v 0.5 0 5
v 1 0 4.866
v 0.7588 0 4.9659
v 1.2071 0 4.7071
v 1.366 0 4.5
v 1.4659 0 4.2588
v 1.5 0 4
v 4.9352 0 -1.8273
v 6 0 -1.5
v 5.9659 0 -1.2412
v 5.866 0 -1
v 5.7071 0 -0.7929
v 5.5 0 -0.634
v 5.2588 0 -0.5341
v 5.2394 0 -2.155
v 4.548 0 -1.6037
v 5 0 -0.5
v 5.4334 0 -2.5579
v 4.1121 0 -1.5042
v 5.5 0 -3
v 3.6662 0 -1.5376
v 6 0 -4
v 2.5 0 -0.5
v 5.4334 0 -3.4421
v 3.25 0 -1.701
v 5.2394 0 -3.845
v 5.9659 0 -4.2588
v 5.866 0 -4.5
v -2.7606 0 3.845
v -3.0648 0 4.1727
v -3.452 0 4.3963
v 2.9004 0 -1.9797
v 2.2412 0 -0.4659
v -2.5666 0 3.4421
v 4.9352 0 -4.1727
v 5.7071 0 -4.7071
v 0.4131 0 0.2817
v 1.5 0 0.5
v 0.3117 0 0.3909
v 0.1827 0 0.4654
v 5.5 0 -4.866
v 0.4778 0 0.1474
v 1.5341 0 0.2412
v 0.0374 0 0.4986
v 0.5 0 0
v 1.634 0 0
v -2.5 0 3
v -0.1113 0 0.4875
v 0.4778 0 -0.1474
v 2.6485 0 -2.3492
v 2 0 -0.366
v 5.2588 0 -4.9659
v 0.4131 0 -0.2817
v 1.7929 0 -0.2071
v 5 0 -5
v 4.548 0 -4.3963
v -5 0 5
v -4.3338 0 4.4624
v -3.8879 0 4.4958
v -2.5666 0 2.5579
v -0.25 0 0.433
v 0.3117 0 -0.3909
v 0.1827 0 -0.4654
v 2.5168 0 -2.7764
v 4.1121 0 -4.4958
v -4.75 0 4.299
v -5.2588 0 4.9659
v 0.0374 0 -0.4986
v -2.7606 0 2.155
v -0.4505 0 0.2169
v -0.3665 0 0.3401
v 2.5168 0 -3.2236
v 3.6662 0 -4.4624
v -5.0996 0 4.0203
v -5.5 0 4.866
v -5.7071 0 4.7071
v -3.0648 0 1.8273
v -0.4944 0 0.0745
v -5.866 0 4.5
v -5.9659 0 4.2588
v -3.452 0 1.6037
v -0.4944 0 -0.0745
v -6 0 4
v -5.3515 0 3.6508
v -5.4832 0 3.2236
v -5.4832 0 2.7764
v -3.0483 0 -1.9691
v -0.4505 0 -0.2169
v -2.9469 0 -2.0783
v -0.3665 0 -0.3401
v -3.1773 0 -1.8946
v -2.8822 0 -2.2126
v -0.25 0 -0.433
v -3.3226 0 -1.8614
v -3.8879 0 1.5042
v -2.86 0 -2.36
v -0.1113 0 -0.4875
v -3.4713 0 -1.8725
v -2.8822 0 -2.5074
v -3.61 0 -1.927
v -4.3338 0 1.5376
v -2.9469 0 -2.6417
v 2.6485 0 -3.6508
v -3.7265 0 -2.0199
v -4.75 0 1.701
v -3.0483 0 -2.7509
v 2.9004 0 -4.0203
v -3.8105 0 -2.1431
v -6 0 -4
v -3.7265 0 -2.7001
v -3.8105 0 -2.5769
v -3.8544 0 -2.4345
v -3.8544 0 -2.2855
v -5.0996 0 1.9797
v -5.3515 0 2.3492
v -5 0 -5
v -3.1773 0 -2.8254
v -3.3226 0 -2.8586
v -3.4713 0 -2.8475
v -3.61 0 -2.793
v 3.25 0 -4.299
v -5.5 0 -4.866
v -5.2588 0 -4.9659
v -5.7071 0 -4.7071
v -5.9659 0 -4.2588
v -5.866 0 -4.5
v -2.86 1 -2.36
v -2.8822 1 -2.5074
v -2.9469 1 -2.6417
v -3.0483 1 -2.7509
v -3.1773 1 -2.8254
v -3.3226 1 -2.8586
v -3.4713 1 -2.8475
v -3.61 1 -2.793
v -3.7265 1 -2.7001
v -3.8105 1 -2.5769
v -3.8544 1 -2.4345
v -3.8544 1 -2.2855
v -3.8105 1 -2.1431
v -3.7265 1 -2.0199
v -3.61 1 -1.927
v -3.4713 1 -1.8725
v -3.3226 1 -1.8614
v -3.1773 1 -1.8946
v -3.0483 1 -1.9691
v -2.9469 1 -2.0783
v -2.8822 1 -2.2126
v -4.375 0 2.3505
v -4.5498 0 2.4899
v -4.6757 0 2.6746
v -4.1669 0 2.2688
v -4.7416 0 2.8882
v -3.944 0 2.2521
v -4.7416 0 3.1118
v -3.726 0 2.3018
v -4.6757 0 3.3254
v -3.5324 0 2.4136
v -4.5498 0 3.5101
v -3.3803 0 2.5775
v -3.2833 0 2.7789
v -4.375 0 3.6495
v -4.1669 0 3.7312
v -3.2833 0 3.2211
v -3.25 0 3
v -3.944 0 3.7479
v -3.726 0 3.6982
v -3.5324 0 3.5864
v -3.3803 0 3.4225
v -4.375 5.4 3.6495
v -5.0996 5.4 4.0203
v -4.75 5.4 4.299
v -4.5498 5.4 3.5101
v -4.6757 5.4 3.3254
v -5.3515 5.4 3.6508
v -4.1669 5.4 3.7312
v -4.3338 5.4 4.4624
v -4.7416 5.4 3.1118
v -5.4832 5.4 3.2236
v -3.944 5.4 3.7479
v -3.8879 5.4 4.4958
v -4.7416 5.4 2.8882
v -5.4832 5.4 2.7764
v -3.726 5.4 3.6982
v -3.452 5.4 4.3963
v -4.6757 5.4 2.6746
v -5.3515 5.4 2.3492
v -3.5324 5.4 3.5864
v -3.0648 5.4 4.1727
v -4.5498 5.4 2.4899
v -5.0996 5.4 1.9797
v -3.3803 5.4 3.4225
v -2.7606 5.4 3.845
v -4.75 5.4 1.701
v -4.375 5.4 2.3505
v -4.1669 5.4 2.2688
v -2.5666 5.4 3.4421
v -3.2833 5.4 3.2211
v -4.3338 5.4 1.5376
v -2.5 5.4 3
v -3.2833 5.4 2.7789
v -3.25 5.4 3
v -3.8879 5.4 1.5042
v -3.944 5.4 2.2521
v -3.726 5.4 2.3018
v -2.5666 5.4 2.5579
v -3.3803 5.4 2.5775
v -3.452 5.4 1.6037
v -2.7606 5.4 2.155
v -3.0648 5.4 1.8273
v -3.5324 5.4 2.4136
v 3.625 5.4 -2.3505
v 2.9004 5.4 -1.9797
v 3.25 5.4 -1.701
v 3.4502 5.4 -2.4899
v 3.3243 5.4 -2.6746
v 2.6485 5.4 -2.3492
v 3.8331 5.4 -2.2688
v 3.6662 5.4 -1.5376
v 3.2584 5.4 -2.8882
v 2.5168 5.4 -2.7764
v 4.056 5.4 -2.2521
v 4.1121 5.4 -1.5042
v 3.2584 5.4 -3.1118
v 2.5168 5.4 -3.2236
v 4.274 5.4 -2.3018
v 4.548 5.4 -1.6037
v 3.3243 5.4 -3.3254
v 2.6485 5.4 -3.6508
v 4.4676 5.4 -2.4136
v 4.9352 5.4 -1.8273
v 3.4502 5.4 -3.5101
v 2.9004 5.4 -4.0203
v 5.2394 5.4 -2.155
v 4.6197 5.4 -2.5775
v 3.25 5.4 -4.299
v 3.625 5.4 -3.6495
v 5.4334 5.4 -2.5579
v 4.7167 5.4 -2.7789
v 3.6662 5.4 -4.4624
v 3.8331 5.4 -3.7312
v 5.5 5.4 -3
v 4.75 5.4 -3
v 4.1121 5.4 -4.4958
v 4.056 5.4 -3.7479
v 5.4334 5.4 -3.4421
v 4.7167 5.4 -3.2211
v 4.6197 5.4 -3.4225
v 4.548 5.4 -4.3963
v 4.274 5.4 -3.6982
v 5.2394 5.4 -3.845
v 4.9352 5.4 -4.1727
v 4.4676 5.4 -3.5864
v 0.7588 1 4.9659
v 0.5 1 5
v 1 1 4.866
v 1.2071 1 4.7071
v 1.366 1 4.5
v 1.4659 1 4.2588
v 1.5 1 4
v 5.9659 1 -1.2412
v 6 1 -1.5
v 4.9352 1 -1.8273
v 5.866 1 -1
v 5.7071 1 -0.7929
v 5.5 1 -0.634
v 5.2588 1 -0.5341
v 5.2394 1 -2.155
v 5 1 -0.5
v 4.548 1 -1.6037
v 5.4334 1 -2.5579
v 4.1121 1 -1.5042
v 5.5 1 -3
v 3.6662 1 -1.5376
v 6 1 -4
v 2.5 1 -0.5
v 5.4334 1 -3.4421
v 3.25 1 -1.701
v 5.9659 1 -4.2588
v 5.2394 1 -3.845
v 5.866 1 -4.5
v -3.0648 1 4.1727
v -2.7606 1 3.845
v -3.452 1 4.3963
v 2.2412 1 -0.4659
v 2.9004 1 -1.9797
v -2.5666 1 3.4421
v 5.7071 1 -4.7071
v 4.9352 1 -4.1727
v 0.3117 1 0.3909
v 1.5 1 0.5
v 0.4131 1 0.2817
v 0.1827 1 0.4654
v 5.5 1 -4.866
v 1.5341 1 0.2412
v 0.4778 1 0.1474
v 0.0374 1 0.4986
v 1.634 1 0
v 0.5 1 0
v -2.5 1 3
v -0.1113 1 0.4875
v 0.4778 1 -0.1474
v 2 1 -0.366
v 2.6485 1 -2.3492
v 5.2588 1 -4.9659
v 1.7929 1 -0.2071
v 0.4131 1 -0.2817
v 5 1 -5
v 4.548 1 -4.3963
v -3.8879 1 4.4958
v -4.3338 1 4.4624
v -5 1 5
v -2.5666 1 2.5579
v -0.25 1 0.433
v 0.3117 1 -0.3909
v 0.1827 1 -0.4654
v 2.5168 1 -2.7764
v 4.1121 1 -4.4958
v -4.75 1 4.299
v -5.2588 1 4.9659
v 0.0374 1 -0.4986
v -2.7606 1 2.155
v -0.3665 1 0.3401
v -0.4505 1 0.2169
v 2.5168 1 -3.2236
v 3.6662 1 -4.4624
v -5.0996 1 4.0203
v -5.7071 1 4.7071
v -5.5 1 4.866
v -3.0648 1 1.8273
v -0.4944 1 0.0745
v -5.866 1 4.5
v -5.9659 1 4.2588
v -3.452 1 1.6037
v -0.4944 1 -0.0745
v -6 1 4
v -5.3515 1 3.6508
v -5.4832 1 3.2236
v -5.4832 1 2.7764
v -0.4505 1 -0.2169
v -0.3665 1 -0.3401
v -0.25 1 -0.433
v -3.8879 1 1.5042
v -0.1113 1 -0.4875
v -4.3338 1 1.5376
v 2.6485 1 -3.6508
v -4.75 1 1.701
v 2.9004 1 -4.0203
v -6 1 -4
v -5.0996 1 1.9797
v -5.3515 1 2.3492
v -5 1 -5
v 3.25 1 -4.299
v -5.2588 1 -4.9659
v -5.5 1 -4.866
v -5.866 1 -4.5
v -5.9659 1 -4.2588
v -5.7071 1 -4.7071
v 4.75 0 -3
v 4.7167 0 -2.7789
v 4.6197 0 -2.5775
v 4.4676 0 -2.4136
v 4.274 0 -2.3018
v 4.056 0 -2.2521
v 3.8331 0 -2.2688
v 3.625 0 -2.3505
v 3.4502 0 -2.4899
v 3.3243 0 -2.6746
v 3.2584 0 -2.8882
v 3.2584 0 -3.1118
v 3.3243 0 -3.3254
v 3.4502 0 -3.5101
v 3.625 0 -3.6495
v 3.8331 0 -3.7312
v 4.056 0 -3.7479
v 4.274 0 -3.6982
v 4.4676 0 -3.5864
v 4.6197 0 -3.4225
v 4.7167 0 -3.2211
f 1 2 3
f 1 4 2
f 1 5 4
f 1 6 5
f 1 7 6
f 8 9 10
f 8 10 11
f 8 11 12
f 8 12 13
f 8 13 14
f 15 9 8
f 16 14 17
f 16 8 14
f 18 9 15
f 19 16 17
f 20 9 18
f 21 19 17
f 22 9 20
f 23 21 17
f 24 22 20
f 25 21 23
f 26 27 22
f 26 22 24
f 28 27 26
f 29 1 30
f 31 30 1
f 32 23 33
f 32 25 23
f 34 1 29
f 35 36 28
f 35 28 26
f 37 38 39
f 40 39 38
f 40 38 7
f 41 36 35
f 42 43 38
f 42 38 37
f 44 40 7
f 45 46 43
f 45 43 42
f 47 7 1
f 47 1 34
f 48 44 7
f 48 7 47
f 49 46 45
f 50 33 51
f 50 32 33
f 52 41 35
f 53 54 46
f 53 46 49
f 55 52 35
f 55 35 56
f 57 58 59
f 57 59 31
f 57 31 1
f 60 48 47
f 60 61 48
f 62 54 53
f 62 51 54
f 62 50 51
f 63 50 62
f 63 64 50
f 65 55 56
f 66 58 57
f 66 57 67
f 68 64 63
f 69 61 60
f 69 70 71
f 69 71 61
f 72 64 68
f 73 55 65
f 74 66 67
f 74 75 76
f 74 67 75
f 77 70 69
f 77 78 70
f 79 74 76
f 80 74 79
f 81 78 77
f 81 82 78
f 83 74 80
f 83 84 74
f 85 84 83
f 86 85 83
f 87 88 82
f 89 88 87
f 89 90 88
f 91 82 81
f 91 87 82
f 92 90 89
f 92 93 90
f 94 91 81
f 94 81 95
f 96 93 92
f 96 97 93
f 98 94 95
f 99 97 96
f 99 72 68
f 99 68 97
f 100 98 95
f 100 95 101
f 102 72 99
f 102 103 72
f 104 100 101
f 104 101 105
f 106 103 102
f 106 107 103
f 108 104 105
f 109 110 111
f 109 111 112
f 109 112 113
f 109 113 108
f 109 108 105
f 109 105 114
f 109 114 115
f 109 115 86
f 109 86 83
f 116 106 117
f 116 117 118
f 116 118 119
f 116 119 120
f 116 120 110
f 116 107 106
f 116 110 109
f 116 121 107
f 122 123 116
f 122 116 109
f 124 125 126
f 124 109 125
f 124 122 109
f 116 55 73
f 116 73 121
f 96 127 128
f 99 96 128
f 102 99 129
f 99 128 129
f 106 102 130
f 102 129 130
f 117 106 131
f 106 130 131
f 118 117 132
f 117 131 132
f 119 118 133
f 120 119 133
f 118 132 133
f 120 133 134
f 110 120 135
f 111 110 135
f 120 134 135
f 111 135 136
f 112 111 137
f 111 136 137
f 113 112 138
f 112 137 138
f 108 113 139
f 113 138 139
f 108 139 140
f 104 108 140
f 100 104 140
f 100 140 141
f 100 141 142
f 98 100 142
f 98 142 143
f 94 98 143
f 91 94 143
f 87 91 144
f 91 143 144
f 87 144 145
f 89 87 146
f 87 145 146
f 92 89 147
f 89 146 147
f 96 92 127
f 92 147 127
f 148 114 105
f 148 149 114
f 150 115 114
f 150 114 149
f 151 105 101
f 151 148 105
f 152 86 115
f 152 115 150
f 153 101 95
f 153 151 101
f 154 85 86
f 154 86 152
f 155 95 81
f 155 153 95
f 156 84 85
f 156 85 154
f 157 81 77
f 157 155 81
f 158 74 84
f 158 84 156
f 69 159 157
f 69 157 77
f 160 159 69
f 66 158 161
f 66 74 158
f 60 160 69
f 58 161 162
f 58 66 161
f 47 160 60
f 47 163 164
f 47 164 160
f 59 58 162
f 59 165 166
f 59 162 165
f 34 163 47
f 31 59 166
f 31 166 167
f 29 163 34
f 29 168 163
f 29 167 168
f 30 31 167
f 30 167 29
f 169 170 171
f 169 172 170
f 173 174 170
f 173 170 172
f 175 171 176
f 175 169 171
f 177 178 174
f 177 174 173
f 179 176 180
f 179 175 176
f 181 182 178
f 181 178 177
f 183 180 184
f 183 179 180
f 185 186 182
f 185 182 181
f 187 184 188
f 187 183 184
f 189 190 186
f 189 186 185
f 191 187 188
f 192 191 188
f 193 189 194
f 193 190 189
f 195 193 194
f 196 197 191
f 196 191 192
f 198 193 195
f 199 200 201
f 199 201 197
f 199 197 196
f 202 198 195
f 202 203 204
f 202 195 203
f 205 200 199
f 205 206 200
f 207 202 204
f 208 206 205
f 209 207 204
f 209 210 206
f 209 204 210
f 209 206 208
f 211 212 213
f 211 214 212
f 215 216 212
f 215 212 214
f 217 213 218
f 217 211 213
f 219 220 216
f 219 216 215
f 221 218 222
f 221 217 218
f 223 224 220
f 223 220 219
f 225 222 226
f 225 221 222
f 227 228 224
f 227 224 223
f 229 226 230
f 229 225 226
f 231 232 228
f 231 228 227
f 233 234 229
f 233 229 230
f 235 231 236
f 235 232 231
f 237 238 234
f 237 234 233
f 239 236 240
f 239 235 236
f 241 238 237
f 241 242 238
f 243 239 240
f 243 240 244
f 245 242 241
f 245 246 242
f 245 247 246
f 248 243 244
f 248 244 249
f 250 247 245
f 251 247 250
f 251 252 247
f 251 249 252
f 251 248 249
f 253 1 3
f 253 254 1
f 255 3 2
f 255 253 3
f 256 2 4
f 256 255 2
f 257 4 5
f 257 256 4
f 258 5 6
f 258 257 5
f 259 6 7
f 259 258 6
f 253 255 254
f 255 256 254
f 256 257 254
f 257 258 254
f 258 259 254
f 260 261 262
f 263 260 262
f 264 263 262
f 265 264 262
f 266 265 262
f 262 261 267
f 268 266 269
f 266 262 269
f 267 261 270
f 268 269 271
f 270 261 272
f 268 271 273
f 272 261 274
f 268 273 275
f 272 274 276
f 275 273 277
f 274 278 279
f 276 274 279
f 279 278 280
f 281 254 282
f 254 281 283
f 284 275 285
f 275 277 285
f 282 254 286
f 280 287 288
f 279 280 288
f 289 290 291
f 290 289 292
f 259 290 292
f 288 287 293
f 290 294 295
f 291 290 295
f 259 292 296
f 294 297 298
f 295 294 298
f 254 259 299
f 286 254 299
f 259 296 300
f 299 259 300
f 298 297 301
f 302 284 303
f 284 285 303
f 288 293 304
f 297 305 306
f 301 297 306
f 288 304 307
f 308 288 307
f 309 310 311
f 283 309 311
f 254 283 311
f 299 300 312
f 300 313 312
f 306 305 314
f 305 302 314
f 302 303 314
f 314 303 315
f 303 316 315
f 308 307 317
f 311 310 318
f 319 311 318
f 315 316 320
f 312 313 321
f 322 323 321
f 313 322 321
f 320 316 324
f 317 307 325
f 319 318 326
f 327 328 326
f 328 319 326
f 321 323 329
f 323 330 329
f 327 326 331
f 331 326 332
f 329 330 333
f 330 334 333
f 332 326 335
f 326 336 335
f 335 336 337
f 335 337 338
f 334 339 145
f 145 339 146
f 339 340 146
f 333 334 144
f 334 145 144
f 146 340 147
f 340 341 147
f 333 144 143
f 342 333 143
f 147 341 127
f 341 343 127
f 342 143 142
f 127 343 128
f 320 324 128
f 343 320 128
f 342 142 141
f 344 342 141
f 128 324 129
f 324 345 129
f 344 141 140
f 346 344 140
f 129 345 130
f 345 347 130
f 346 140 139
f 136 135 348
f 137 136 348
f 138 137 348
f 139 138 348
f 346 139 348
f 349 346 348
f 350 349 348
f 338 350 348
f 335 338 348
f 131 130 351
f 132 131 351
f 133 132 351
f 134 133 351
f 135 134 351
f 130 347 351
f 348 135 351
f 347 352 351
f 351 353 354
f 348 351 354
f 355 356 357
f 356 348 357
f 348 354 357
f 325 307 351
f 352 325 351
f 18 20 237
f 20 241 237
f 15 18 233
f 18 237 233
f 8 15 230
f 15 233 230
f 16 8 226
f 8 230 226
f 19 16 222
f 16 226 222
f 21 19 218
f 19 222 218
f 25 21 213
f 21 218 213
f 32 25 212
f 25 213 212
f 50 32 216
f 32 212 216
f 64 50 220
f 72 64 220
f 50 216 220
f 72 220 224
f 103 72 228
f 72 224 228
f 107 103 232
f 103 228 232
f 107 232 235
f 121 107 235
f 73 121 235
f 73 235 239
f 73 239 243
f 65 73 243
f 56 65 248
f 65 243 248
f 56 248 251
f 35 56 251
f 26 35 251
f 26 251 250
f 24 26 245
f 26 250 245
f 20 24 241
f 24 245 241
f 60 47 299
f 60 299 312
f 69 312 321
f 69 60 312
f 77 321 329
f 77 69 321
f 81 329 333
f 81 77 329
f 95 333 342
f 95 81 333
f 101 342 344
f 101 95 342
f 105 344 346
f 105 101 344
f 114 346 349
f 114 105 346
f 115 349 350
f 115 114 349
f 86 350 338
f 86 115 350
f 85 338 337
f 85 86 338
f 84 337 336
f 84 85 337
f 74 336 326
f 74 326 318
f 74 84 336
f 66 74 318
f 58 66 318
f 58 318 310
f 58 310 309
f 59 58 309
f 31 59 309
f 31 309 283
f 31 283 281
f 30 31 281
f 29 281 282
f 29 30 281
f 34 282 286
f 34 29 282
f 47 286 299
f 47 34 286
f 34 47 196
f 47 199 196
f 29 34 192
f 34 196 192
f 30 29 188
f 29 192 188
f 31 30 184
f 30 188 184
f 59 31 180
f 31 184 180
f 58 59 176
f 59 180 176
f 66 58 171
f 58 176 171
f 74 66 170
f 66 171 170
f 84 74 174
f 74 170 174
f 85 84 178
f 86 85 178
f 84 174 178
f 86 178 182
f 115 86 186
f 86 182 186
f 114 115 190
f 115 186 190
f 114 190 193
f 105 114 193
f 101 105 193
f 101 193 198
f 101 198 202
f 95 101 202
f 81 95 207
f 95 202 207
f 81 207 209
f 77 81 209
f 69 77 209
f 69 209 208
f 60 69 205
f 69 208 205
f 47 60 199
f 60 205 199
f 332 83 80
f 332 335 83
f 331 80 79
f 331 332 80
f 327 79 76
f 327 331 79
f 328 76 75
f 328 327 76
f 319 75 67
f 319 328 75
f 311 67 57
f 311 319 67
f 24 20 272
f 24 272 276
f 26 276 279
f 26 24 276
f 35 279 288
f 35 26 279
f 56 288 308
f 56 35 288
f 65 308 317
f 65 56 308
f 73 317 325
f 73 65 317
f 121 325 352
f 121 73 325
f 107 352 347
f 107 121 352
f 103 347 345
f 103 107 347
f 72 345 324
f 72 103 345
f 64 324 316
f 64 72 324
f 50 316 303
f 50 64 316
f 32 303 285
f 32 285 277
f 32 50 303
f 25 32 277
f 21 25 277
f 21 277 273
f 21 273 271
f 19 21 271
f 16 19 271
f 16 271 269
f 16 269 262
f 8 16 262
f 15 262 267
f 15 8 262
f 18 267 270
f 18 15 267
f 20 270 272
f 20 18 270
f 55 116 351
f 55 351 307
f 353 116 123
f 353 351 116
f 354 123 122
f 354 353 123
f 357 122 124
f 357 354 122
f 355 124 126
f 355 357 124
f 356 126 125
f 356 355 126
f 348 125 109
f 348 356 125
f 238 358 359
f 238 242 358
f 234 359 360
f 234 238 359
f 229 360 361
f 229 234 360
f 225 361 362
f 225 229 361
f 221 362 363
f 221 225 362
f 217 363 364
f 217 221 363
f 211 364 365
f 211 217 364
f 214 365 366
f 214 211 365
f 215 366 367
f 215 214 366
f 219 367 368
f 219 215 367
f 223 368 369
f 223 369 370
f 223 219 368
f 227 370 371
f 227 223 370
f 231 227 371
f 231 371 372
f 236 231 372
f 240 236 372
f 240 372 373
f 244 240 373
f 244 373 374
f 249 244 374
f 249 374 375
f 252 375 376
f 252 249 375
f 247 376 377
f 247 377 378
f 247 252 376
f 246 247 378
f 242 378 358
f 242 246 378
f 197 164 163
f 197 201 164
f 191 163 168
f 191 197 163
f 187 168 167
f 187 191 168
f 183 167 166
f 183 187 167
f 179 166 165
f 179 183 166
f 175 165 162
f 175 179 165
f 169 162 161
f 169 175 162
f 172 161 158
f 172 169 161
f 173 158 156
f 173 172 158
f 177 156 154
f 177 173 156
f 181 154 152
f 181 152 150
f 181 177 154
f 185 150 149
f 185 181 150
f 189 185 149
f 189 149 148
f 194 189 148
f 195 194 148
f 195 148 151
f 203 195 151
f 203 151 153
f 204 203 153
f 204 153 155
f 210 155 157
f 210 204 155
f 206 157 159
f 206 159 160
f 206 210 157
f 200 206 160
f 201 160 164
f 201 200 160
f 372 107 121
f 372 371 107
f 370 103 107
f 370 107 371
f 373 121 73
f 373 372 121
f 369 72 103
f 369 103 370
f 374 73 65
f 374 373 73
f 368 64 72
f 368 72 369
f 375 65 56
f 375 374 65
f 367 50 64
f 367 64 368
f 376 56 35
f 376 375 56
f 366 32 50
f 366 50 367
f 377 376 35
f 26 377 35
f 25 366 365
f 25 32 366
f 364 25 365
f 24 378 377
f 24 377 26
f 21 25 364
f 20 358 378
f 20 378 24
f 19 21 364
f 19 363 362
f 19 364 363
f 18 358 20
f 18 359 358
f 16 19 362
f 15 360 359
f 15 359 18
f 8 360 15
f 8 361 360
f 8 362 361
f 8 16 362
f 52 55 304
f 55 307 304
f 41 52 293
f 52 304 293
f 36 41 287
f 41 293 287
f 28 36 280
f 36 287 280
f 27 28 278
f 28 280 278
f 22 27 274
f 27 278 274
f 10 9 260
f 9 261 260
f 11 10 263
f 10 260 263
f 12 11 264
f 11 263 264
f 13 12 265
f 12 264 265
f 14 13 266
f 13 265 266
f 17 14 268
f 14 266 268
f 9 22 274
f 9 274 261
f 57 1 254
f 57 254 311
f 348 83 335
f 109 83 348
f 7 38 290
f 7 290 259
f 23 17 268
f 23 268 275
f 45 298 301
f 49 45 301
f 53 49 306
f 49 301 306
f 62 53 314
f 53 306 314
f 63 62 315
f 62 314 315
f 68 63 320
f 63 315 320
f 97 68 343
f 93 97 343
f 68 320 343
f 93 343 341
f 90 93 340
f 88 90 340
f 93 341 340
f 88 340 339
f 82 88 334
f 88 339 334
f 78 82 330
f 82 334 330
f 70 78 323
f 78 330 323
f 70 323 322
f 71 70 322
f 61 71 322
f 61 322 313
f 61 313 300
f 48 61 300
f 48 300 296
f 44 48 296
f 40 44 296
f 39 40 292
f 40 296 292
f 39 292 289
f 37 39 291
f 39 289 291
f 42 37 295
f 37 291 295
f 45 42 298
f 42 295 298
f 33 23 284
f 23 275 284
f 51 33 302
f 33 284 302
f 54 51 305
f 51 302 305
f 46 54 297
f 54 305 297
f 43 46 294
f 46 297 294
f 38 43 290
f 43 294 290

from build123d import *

# Parameters (mm, degrees)
CROQUIS1_R                = 1.5
SALIENTE_EXTRUIR1_DEPTH   = 1
CROQUIS2_R                = 1.5
SALIENTE_EXTRUIR2_DEPTH   = 4.4
SALIENTE_EXTRUIR2_2_DEPTH = 4.4
CROQUIS3_R                = 0.75
CORTAR_EXTRUIR1_DEPTH     = 8
REDONDEO1_R               = 1
CROQUIS4_R                = 1.5
CROQUIS4_R_2              = 0.75
SALIENTE_EXTRUIR3_DEPTH   = 1
CROQUIS5_R                = 0.5
CORTAR_EXTRUIR2_DEPTH     = 1


with BuildPart() as part:
    # Croquis1 → Saliente-Extruir1 (new body)
    with BuildSketch(Plane(origin=(0, 0, 0), x_dir=(1, 0, 0), z_dir=(0, 1, 0))):
        Polygon((-6, 5), (6, 5), (6, 0.5), (1.5, 0.5), (1.5, -5), (-6, -5), align=None)
        with Locations((4, 3)):
            Circle(CROQUIS1_R, mode=Mode.SUBTRACT)
        with Locations((-4, -3)):
            Circle(CROQUIS1_R, mode=Mode.SUBTRACT)
    extrude(amount=SALIENTE_EXTRUIR1_DEPTH)

    # Redondeo1
    redondeo1_edges = [part.edges().sort_by_distance(p)[0] for p in [
        (-6, 0.5, -5),
        (6, 0.5, -5),
        (6, 0.5, -0.5),
        (1.5, 0.5, -0.5),
        (1.5, 0.5, 5),
        (-6, 0.5, 5),
    ]]
    fillet(redondeo1_edges, radius=REDONDEO1_R)

    # Croquis5 → Cortar-Extruir2 (cut)
    with BuildSketch(Plane(origin=(0, 1, 0), x_dir=(1, 0, 0), z_dir=(0, 1, 0))):
        with Locations((-3.36, 2.36)):
            Circle(CROQUIS5_R)
        Circle(CROQUIS5_R)
    extrude(amount=-CORTAR_EXTRUIR2_DEPTH, mode=Mode.SUBTRACT)


with BuildPart() as body_2:
    # Croquis2 → Saliente-Extruir2 (new body)
    with BuildSketch(Plane(origin=(0, 1, 0), x_dir=(1, 0, 0), z_dir=(0, 1, 0))):
        with Locations((4, 3)):
            Circle(CROQUIS2_R)
    extrude(amount=SALIENTE_EXTRUIR2_DEPTH)


with BuildPart() as body_3:
    # Croquis2 → Saliente-Extruir2 2 (new body)
    with BuildSketch(Plane(origin=(0, 1, 0), x_dir=(1, 0, 0), z_dir=(0, 1, 0))):
        with Locations((-4, -3)):
            Circle(CROQUIS2_R)
    extrude(amount=SALIENTE_EXTRUIR2_2_DEPTH)


with BuildPart() as cortar_extruir1_tool:
    # Croquis3 → Cortar-Extruir1 (new body)
    with BuildSketch(Plane(origin=(0, 5.4, 0), x_dir=(1, 0, 0), z_dir=(0, 1, 0))):
        with Locations((4, 3)):
            Circle(CROQUIS3_R)
        with Locations((-4, -3)):
            Circle(CROQUIS3_R)
    extrude(amount=-CORTAR_EXTRUIR1_DEPTH)


with BuildPart() as body_2_1:
    add(body_2.part)

    # Cortar-Extruir1: cut by cortar_extruir1_tool
    add(cortar_extruir1_tool.part, mode=Mode.SUBTRACT)


with BuildPart() as body_3_1:
    add(body_3.part)

    # Cortar-Extruir1: cut by cortar_extruir1_tool
    add(cortar_extruir1_tool.part, mode=Mode.SUBTRACT)


    add(body_2_1.part)  # Saliente-Extruir3 merges body 2
    # Croquis4 → Saliente-Extruir3 (add)
    with BuildSketch(Plane.XZ.offset(-1)):
        with Locations((4, -3)):
            Circle(CROQUIS4_R)
        with Locations((4, -3)):
            Circle(CROQUIS4_R_2, mode=Mode.SUBTRACT)
        with Locations((-4, 3)):
            Circle(CROQUIS4_R)
        with Locations((-4, 3)):
            Circle(CROQUIS4_R_2, mode=Mode.SUBTRACT)
    extrude(amount=SALIENTE_EXTRUIR3_DEPTH)


solid = Compound([part.part, body_3_1.part])
